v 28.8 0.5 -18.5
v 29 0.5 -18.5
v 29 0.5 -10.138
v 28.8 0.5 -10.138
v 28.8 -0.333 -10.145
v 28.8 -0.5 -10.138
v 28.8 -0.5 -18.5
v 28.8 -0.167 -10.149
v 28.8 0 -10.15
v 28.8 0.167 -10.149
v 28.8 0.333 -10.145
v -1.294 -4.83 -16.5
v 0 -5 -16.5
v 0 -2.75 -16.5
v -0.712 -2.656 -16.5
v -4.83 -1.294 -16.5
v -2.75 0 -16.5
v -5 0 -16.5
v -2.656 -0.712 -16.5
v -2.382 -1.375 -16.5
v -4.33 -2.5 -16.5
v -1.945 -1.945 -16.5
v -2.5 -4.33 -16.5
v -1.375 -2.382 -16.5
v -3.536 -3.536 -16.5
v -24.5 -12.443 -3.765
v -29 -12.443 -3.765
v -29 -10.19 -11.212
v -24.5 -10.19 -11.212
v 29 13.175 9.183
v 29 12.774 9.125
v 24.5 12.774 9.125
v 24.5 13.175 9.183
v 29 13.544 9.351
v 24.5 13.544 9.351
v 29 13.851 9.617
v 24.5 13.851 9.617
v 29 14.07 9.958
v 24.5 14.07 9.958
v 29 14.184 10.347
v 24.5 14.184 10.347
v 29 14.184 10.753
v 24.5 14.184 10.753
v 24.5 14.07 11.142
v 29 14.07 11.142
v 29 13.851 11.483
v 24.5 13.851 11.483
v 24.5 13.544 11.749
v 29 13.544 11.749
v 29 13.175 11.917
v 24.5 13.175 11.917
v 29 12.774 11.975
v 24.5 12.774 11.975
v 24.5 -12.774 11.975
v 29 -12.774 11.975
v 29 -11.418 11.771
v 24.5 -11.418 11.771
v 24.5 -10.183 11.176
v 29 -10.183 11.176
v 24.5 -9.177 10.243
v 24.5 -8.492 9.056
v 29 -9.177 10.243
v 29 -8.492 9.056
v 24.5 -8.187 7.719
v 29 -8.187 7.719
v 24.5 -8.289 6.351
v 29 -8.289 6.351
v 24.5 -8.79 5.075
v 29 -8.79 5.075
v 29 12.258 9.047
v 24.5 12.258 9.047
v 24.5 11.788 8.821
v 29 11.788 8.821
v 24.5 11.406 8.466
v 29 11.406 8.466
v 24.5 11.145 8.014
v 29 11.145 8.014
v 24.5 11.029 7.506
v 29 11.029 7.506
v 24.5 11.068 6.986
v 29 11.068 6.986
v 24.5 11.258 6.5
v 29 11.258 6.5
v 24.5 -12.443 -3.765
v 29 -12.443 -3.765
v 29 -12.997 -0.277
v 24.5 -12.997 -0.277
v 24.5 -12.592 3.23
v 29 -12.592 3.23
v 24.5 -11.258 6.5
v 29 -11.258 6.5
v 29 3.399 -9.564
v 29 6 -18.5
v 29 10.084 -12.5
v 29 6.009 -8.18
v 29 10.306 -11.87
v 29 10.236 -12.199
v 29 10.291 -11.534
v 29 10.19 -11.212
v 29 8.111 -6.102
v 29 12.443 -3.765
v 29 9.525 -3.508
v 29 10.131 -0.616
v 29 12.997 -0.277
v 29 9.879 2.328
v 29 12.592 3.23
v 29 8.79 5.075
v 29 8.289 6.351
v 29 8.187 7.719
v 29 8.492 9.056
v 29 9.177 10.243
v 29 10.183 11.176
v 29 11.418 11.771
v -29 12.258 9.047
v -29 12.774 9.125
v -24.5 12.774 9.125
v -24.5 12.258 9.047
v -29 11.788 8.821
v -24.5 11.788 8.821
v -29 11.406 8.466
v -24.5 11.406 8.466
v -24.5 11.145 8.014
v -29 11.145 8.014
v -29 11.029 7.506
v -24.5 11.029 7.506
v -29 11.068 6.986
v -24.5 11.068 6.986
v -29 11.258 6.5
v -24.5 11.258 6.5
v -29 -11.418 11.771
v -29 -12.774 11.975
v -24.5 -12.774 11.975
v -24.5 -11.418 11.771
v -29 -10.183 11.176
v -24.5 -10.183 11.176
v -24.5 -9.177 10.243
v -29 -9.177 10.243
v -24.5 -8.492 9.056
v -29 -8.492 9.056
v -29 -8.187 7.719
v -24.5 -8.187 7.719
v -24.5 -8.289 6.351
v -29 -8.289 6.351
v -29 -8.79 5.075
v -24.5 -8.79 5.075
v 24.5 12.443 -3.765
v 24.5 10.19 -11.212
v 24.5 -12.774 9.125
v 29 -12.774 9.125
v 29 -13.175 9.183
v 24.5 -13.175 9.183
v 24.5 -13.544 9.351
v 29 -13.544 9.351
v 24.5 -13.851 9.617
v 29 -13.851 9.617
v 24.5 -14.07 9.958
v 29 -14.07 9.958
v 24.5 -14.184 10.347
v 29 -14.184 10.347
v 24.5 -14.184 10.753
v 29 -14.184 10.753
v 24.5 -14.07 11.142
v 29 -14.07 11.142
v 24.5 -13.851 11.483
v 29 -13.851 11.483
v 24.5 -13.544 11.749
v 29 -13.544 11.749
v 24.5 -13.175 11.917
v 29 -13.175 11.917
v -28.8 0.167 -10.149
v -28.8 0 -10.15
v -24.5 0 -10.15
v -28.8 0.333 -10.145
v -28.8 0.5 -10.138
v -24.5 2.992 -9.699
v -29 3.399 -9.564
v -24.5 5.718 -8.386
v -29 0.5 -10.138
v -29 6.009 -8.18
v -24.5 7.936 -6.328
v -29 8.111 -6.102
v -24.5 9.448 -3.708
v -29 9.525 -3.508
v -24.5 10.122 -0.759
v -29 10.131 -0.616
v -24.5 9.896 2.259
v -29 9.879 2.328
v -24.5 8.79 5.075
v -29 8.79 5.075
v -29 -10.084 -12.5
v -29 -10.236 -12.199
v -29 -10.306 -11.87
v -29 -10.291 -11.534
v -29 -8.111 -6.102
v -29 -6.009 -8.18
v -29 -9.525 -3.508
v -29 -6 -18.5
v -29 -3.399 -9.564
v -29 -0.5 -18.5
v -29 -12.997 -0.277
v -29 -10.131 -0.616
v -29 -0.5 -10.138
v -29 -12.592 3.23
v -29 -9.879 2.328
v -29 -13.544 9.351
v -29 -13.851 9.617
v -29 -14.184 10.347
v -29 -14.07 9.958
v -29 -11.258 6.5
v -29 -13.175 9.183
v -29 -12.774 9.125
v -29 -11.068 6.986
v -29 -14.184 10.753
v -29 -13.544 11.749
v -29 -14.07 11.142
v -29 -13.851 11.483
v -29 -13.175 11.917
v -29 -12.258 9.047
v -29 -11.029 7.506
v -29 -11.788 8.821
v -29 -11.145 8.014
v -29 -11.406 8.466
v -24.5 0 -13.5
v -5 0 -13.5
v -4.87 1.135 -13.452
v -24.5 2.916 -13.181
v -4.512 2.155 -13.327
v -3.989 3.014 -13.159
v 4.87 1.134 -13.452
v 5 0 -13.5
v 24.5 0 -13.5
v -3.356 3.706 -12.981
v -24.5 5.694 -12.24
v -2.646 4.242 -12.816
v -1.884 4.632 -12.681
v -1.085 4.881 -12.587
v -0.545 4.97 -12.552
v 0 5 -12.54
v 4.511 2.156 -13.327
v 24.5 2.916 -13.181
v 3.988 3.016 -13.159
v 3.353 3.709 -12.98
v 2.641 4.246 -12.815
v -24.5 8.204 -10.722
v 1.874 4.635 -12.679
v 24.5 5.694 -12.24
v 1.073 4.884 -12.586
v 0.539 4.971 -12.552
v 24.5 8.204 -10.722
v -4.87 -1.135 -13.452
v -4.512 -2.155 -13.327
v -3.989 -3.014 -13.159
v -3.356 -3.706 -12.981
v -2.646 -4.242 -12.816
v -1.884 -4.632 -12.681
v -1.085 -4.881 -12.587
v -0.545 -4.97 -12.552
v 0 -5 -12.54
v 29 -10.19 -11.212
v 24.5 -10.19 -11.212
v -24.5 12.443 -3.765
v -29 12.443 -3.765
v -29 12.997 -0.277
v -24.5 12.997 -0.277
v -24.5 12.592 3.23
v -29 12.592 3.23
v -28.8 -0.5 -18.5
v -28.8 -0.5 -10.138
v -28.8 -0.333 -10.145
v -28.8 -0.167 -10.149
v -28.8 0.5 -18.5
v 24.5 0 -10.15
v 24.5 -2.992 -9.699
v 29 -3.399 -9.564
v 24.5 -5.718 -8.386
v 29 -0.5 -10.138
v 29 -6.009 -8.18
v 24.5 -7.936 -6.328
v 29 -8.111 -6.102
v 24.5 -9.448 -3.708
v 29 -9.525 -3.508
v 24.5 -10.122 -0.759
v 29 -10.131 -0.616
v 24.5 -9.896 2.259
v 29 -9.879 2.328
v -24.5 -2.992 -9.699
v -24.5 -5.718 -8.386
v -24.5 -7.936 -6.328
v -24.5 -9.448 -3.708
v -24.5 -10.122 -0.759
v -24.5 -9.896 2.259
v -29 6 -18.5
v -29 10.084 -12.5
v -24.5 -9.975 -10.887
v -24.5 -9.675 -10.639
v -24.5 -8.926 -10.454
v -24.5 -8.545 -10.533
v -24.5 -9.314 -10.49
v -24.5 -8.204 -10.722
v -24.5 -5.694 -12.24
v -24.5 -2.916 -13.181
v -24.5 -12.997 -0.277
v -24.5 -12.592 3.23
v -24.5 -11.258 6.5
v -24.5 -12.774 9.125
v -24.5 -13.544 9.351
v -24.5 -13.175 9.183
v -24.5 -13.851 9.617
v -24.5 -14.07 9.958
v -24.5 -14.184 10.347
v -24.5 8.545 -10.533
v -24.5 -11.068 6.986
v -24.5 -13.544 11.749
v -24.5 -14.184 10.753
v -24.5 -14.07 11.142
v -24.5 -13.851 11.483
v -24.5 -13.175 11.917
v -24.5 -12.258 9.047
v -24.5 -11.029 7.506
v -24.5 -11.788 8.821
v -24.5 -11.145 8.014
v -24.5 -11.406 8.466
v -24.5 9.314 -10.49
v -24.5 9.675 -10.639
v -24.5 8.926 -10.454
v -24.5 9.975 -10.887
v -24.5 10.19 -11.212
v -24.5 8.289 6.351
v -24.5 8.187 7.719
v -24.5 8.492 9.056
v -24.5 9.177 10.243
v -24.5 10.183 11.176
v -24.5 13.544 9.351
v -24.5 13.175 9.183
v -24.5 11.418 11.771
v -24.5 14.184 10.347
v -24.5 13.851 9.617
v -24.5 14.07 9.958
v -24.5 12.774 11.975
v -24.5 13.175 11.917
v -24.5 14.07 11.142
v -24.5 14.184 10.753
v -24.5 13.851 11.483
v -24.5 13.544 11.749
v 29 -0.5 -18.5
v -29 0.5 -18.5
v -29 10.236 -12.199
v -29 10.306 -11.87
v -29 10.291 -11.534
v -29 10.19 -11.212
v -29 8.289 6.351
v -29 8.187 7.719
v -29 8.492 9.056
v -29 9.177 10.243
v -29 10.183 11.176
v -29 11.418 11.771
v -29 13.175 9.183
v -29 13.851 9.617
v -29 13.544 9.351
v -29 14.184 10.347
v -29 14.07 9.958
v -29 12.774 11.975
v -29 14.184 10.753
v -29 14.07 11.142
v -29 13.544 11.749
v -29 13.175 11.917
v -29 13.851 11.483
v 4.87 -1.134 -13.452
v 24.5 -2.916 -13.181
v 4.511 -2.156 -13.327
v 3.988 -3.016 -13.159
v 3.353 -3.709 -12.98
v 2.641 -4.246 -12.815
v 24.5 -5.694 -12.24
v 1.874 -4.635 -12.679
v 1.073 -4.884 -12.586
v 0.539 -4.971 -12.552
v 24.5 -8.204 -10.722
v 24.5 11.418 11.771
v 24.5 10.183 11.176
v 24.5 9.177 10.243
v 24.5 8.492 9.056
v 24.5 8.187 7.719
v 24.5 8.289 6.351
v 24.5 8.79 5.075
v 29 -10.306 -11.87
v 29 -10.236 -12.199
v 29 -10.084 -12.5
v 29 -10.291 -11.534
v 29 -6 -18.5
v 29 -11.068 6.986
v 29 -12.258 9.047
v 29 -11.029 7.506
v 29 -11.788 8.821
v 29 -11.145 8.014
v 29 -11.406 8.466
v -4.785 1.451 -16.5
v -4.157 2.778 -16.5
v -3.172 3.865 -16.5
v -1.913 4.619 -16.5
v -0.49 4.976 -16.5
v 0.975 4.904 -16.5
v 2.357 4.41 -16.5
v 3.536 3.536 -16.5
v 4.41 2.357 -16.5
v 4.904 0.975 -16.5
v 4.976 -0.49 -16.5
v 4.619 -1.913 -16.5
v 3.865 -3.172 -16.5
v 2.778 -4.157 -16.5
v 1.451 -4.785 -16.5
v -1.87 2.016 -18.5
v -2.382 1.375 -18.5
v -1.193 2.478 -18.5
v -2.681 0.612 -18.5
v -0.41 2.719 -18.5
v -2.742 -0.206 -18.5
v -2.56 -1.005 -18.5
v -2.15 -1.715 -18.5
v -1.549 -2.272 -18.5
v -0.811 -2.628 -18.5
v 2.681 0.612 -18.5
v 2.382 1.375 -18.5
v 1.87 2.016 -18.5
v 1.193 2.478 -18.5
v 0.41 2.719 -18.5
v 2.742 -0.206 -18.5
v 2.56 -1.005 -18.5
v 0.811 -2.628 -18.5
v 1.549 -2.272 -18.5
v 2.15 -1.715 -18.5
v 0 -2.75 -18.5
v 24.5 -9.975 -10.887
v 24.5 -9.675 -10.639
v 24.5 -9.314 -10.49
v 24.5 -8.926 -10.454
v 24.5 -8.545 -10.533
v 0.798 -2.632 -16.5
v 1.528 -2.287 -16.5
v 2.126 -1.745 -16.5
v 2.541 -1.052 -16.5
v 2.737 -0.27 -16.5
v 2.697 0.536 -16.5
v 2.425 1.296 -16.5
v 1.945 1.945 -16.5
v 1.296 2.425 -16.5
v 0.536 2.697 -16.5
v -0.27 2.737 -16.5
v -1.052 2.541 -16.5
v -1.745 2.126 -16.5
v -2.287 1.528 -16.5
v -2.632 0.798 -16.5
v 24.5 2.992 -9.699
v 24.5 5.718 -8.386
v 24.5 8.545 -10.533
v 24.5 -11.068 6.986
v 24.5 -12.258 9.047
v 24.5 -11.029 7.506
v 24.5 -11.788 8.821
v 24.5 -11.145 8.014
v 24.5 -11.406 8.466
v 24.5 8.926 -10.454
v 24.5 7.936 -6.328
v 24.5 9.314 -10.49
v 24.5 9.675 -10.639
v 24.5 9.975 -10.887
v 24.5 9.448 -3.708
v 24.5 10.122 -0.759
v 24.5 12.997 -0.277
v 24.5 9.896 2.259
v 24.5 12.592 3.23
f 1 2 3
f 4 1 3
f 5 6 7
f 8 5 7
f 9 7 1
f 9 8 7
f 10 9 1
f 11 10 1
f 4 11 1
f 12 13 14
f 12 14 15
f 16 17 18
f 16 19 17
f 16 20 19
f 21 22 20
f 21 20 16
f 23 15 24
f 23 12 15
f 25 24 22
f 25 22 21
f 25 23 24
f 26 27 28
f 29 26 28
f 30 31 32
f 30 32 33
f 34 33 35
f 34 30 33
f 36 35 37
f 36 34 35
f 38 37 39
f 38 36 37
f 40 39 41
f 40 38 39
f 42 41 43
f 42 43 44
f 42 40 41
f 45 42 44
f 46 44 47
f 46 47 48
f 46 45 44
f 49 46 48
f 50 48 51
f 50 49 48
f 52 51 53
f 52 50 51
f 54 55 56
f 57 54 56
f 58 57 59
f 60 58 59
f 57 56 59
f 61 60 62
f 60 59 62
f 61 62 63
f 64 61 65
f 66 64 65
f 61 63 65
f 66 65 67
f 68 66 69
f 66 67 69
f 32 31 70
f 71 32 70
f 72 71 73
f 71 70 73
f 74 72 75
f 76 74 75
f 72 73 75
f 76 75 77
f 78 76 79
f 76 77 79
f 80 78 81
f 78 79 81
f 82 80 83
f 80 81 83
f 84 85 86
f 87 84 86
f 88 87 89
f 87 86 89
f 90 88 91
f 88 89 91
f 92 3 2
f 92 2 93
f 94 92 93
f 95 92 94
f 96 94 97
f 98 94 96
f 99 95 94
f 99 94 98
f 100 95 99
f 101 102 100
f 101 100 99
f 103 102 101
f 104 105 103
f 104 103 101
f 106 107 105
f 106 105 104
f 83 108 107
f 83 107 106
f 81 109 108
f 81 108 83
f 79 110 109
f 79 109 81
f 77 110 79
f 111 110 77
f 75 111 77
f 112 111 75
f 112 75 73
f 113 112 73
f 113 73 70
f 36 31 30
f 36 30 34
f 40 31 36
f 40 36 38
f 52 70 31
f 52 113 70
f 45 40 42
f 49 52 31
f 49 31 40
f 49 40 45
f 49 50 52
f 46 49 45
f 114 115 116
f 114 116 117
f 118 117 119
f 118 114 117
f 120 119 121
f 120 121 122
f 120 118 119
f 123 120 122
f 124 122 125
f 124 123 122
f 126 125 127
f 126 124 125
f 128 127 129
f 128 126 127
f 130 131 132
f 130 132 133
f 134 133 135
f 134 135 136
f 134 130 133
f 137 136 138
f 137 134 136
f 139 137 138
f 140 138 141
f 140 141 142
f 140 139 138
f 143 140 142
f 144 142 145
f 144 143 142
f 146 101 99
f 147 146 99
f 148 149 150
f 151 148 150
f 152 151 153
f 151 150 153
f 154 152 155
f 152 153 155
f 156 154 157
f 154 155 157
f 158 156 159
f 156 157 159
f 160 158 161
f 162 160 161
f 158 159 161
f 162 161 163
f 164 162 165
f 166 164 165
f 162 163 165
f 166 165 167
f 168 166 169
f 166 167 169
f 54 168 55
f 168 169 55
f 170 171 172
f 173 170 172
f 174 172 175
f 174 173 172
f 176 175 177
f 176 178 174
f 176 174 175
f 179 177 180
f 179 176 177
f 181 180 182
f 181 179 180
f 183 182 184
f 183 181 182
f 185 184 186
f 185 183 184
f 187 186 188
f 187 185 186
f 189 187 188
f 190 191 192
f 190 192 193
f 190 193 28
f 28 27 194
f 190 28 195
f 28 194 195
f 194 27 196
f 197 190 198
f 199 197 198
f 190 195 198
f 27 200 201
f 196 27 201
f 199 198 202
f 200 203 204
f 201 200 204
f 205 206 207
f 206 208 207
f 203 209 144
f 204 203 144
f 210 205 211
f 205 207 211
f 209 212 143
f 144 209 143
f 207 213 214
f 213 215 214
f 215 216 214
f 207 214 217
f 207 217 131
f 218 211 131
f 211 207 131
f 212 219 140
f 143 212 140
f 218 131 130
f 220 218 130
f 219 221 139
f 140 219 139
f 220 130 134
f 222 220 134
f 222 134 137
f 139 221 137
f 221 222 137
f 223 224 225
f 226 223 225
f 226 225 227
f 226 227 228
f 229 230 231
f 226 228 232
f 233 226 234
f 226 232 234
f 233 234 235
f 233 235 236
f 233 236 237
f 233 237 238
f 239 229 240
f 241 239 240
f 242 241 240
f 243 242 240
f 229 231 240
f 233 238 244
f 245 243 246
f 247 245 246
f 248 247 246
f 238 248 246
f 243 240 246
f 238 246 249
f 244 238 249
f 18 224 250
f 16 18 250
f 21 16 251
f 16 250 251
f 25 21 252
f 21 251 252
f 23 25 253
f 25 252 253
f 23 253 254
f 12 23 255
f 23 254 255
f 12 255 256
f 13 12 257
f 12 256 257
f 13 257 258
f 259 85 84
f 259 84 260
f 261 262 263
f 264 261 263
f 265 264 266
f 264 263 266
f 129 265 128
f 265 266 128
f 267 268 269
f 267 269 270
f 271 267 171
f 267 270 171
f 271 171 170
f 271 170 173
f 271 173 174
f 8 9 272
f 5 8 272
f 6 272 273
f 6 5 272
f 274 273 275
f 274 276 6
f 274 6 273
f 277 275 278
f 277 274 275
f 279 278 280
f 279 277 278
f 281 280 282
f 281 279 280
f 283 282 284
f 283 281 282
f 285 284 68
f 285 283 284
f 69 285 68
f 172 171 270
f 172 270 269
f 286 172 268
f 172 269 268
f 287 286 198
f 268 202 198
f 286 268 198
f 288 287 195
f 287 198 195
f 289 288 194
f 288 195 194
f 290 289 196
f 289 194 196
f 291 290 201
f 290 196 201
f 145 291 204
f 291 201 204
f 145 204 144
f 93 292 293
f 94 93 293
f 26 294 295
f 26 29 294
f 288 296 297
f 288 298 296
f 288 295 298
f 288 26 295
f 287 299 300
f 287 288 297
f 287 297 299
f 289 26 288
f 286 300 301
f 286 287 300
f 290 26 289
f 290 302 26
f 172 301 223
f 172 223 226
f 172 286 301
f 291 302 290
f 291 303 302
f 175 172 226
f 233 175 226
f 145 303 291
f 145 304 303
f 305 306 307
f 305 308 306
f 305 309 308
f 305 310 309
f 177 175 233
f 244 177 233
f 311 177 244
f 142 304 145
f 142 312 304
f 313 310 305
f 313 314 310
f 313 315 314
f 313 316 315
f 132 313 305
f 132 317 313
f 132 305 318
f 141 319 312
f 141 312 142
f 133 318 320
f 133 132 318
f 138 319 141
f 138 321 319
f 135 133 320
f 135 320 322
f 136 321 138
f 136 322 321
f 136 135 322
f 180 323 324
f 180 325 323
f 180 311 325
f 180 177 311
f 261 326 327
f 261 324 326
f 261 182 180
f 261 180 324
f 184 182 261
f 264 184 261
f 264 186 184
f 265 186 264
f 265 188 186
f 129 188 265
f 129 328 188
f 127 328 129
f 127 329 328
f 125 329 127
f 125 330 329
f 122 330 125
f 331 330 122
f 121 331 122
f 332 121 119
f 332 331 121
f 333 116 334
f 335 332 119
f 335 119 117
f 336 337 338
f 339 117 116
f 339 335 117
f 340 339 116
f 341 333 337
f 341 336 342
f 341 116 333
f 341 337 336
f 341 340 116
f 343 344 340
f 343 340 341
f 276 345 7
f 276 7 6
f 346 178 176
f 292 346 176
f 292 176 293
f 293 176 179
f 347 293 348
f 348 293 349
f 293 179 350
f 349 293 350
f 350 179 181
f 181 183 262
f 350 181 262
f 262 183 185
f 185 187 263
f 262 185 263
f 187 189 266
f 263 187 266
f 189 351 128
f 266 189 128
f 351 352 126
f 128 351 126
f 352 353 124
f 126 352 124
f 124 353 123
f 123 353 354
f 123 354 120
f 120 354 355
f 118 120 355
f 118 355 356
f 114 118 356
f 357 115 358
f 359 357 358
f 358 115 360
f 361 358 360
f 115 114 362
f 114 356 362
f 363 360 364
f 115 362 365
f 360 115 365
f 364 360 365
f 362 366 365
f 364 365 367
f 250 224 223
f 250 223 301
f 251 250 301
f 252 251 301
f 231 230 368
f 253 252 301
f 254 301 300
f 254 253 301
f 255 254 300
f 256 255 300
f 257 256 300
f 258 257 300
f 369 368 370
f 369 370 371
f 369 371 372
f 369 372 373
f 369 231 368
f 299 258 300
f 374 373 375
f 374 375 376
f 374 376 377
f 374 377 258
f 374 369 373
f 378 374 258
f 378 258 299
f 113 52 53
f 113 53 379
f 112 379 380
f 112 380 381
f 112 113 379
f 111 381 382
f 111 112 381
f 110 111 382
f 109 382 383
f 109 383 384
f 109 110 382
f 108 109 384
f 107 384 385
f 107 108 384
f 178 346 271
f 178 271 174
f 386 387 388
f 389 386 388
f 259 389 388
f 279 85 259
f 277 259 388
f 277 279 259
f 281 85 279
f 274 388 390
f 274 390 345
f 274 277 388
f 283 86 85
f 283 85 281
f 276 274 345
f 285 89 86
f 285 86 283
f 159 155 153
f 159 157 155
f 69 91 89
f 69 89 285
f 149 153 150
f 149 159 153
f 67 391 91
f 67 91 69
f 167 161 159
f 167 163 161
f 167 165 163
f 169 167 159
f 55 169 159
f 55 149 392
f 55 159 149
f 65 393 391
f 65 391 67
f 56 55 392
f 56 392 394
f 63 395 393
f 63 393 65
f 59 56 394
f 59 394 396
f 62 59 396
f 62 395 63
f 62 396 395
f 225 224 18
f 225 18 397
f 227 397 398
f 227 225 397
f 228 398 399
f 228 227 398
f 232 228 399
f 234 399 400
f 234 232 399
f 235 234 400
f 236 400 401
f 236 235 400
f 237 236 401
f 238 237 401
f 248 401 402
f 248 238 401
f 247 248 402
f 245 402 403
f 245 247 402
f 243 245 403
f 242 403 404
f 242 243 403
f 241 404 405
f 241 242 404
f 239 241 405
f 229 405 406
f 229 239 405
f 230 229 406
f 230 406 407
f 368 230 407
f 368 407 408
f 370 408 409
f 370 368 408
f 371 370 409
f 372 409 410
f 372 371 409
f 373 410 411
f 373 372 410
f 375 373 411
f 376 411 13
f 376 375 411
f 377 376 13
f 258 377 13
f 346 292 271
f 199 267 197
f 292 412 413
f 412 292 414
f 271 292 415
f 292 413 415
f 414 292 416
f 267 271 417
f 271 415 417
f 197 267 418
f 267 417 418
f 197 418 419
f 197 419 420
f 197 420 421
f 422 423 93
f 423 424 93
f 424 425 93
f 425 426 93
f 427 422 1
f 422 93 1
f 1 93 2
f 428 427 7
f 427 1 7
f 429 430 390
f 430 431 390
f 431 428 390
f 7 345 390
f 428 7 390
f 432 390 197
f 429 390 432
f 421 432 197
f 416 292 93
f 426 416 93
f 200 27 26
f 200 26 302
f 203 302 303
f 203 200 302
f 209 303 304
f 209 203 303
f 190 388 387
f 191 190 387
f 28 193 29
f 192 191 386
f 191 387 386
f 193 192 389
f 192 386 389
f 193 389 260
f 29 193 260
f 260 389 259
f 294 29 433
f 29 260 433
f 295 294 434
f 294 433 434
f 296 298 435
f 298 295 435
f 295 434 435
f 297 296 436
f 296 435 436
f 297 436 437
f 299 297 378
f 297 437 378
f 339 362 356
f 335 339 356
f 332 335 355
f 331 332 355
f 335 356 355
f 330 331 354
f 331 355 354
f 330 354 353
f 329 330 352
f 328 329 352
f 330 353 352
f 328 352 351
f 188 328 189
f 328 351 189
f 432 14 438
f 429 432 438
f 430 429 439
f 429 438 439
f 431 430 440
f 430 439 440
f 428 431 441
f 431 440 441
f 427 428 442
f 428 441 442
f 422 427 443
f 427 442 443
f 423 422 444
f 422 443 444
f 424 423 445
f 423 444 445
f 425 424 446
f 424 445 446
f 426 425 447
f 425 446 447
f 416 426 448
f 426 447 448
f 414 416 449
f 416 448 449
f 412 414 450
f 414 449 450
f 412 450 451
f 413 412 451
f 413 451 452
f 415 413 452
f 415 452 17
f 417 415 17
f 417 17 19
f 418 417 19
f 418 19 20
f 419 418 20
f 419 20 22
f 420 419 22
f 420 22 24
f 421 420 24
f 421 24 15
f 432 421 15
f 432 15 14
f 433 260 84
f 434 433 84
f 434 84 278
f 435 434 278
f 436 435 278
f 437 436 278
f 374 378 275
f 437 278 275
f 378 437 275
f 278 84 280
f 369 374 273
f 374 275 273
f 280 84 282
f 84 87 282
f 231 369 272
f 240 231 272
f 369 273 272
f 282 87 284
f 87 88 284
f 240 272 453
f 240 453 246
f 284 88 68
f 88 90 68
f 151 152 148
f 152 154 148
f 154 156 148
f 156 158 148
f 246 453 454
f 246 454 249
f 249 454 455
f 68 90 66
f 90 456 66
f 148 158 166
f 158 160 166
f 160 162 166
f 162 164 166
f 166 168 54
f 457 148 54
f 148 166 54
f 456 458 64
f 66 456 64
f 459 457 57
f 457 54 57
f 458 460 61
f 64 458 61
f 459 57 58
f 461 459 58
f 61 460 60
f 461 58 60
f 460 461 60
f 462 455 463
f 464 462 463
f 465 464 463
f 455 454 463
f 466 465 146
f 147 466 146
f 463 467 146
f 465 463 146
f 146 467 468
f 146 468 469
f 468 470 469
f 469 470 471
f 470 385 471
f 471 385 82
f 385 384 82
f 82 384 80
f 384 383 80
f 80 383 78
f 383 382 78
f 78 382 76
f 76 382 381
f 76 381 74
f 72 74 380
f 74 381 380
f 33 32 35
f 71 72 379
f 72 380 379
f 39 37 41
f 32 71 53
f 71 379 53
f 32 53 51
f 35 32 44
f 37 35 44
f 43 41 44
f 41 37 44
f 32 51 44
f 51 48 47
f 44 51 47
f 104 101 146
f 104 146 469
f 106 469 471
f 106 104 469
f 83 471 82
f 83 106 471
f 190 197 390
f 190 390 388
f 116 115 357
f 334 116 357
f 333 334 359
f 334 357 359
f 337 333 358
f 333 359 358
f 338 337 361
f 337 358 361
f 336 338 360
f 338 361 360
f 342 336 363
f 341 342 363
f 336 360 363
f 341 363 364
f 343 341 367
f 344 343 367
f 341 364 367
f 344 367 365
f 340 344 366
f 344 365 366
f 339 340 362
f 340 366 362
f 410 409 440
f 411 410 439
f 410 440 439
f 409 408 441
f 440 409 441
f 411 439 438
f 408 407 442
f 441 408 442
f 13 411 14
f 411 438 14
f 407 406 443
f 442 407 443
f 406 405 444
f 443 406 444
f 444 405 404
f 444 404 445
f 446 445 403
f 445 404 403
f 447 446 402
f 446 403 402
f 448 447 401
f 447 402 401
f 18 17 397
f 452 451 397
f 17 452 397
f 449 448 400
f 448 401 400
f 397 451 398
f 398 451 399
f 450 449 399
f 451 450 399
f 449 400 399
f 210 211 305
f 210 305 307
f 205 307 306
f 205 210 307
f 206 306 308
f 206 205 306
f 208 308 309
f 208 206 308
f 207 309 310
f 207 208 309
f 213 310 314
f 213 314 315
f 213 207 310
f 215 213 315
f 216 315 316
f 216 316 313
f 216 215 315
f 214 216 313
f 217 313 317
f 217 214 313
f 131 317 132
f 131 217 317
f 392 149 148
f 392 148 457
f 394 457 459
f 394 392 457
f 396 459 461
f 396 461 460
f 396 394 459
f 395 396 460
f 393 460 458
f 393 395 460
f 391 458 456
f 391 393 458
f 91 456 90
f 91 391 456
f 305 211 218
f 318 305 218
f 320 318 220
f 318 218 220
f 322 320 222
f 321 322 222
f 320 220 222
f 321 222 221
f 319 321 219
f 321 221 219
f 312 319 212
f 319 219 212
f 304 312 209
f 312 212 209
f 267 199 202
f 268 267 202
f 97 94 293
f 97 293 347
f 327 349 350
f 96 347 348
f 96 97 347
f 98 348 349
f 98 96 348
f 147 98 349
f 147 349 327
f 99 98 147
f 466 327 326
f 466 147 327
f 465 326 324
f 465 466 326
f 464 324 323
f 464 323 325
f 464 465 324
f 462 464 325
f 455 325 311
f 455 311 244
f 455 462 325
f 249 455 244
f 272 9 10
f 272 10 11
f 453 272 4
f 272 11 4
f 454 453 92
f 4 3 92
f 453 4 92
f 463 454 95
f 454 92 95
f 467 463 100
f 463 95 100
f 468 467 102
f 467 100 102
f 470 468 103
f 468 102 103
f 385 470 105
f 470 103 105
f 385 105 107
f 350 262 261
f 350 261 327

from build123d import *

# Parameters (mm, degrees)
PAD005_DEPTH                  = 29
PAD006_DEPTH                  = 4.5
SKETCH014_R                   = 2.75
POCKET005_DEPTH               = 107.300407
SKETCH015_R                   = 5
POCKET006_DEPTH               = 16.5
PAD005_MIRRORED002_2_DEPTH    = 29
PAD006_MIRRORED002_2_DEPTH    = 4.5
SKETCH014_MIRRORED002_2_R     = 2.75
POCKET005_MIRRORED002_2_DEPTH = 107.300407
SKETCH015_MIRRORED002_2_R     = 5
POCKET006_MIRRORED002_2_DEPTH = 16.5
SKETCH023_W                   = 1
SKETCH023_H                   = 10
POCKET011_DEPTH               = 0.2


with BuildPart() as part:
    # Sketch012 → Pad005 (new body)
    with BuildSketch(Plane.YZ):
        with BuildLine():
            ThreePointArc((0, -13.5), (4.330629, -12.786542), (8.203522, -10.721578))
            ThreePointArc((10.083563, -12.5), (9.900722, -10.810344), (8.203522, -10.721578))
            Line((6, -18.5), (10.083563, -12.5))
            Line((0, -18.5), (6, -18.5))
            Line((0, -13.5), (0, -18.5))
        make_face()
    pad005 = extrude(amount=PAD005_DEPTH)

    # Sketch013 → Pad006 (join)
    with BuildSketch(Plane.YZ.offset(29)):
        with BuildLine():
            ThreePointArc((0, -10.15), (8.790158, -5.075), (8.790158, 5.075))
            ThreePointArc((12.773875, 11.975), (8.790158, 9.675), (8.790158, 5.075))
            ThreePointArc((12.773875, 9.125), (14.198875, 10.55), (12.773875, 11.975))
            ThreePointArc((12.773875, 9.125), (11.25833, 8.25), (11.25833, 6.5))
            ThreePointArc((12.442941, -3.764734), (12.914285, 1.490384), (11.25833, 6.5))
            Line((12.442941, -3.764734), (9.8, -12.5))
            Line((9.8, -12.5), (0, -14.15))
            Line((0, -10.15), (0, -14.15))
        make_face()
    pad006 = extrude(amount=-PAD006_DEPTH)

    # Sketch014 → Pocket005 (cut, through all)
    with BuildSketch(Plane.XY):
        Circle(SKETCH014_R)
    pocket005 = extrude(amount=-POCKET005_DEPTH, mode=Mode.SUBTRACT)

    # Sketch015 → Pocket006 (cut)
    with BuildSketch(Plane.XY):
        Circle(SKETCH015_R)
    pocket006 = extrude(amount=-POCKET006_DEPTH, mode=Mode.SUBTRACT)

    # Sketch012 Mirrored002 2 → Pad005 Mirrored002 2 (add)
    with BuildSketch(Plane(origin=(0, 0, 0), x_dir=(0, -1, 0), z_dir=(-1, 0, 0))):
        with BuildLine():
            ThreePointArc((0, -13.5), (4.330629, -12.786542), (8.203522, -10.721578))
            ThreePointArc((10.083563, -12.5), (9.900722, -10.810344), (8.203522, -10.721578))
            Line((6, -18.5), (10.083563, -12.5))
            Line((0, -18.5), (6, -18.5))
            Line((0, -13.5), (0, -18.5))
        make_face()
    pad005_mirrored002_2 = extrude(amount=-PAD005_MIRRORED002_2_DEPTH)

    # Sketch013 Mirrored002 2 → Pad006 Mirrored002 2 (add)
    with BuildSketch(Plane(origin=(29, 0, 0), x_dir=(0, -1, 0), z_dir=(-1, 0, 0))):
        with BuildLine():
            ThreePointArc((0, -10.15), (8.790158, -5.075), (8.790158, 5.075))
            ThreePointArc((12.773875, 11.975), (8.790158, 9.675), (8.790158, 5.075))
            ThreePointArc((12.773875, 9.125), (14.198875, 10.55), (12.773875, 11.975))
            ThreePointArc((12.773875, 9.125), (11.25833, 8.25), (11.25833, 6.5))
            ThreePointArc((12.442941, -3.764734), (12.914285, 1.490384), (11.25833, 6.5))
            Line((12.442941, -3.764734), (9.8, -12.5))
            Line((9.8, -12.5), (0, -14.15))
            Line((0, -10.15), (0, -14.15))
        make_face()
    pad006_mirrored002_2 = extrude(amount=PAD006_MIRRORED002_2_DEPTH)

    # Sketch014 Mirrored002 2 → Pocket005 Mirrored002 2 (cut, through all)
    with BuildSketch(Plane(origin=(0, 0, 0), x_dir=(1, 0, 0), z_dir=(0, 0, -1))):
        Circle(SKETCH014_MIRRORED002_2_R)
    pocket005_mirrored002_2 = extrude(amount=POCKET005_MIRRORED002_2_DEPTH, mode=Mode.SUBTRACT)

    # Sketch015 Mirrored002 2 → Pocket006 Mirrored002 2 (cut)
    with BuildSketch(Plane(origin=(0, 0, 0), x_dir=(1, 0, 0), z_dir=(0, 0, -1))):
        Circle(SKETCH015_MIRRORED002_2_R)
    pocket006_mirrored002_2 = extrude(amount=POCKET006_MIRRORED002_2_DEPTH, mode=Mode.SUBTRACT)

    # Mirrored003: Pad005, Pad006, Pocket005, Pocket006, Pad005 Mirrored002 2, Pad006 Mirrored002 2, Pocket005 Mirrored002 2, Pocket006 Mirrored002 2 across YZ
    add(pad005.mirror(Plane.YZ))
    add(pad006.mirror(Plane.YZ))
    add(pocket005.mirror(Plane.YZ), mode=Mode.SUBTRACT)
    add(pocket006.mirror(Plane.YZ), mode=Mode.SUBTRACT)
    add(pad005_mirrored002_2.mirror(Plane.YZ))
    add(pad006_mirrored002_2.mirror(Plane.YZ))
    add(pocket005_mirrored002_2.mirror(Plane.YZ), mode=Mode.SUBTRACT)
    add(pocket006_mirrored002_2.mirror(Plane.YZ), mode=Mode.SUBTRACT)

    # Sketch023 → Pocket011 (cut)
    with BuildSketch(Plane.YZ.offset(29)):
        with Locations((0, -15)):
            Rectangle(SKETCH023_W, SKETCH023_H)
    pocket011 = extrude(amount=-POCKET011_DEPTH, mode=Mode.SUBTRACT)

    # Mirrored006: Pocket011 across YZ
    add(pocket011.mirror(Plane.YZ), mode=Mode.SUBTRACT)


solid = part.part
